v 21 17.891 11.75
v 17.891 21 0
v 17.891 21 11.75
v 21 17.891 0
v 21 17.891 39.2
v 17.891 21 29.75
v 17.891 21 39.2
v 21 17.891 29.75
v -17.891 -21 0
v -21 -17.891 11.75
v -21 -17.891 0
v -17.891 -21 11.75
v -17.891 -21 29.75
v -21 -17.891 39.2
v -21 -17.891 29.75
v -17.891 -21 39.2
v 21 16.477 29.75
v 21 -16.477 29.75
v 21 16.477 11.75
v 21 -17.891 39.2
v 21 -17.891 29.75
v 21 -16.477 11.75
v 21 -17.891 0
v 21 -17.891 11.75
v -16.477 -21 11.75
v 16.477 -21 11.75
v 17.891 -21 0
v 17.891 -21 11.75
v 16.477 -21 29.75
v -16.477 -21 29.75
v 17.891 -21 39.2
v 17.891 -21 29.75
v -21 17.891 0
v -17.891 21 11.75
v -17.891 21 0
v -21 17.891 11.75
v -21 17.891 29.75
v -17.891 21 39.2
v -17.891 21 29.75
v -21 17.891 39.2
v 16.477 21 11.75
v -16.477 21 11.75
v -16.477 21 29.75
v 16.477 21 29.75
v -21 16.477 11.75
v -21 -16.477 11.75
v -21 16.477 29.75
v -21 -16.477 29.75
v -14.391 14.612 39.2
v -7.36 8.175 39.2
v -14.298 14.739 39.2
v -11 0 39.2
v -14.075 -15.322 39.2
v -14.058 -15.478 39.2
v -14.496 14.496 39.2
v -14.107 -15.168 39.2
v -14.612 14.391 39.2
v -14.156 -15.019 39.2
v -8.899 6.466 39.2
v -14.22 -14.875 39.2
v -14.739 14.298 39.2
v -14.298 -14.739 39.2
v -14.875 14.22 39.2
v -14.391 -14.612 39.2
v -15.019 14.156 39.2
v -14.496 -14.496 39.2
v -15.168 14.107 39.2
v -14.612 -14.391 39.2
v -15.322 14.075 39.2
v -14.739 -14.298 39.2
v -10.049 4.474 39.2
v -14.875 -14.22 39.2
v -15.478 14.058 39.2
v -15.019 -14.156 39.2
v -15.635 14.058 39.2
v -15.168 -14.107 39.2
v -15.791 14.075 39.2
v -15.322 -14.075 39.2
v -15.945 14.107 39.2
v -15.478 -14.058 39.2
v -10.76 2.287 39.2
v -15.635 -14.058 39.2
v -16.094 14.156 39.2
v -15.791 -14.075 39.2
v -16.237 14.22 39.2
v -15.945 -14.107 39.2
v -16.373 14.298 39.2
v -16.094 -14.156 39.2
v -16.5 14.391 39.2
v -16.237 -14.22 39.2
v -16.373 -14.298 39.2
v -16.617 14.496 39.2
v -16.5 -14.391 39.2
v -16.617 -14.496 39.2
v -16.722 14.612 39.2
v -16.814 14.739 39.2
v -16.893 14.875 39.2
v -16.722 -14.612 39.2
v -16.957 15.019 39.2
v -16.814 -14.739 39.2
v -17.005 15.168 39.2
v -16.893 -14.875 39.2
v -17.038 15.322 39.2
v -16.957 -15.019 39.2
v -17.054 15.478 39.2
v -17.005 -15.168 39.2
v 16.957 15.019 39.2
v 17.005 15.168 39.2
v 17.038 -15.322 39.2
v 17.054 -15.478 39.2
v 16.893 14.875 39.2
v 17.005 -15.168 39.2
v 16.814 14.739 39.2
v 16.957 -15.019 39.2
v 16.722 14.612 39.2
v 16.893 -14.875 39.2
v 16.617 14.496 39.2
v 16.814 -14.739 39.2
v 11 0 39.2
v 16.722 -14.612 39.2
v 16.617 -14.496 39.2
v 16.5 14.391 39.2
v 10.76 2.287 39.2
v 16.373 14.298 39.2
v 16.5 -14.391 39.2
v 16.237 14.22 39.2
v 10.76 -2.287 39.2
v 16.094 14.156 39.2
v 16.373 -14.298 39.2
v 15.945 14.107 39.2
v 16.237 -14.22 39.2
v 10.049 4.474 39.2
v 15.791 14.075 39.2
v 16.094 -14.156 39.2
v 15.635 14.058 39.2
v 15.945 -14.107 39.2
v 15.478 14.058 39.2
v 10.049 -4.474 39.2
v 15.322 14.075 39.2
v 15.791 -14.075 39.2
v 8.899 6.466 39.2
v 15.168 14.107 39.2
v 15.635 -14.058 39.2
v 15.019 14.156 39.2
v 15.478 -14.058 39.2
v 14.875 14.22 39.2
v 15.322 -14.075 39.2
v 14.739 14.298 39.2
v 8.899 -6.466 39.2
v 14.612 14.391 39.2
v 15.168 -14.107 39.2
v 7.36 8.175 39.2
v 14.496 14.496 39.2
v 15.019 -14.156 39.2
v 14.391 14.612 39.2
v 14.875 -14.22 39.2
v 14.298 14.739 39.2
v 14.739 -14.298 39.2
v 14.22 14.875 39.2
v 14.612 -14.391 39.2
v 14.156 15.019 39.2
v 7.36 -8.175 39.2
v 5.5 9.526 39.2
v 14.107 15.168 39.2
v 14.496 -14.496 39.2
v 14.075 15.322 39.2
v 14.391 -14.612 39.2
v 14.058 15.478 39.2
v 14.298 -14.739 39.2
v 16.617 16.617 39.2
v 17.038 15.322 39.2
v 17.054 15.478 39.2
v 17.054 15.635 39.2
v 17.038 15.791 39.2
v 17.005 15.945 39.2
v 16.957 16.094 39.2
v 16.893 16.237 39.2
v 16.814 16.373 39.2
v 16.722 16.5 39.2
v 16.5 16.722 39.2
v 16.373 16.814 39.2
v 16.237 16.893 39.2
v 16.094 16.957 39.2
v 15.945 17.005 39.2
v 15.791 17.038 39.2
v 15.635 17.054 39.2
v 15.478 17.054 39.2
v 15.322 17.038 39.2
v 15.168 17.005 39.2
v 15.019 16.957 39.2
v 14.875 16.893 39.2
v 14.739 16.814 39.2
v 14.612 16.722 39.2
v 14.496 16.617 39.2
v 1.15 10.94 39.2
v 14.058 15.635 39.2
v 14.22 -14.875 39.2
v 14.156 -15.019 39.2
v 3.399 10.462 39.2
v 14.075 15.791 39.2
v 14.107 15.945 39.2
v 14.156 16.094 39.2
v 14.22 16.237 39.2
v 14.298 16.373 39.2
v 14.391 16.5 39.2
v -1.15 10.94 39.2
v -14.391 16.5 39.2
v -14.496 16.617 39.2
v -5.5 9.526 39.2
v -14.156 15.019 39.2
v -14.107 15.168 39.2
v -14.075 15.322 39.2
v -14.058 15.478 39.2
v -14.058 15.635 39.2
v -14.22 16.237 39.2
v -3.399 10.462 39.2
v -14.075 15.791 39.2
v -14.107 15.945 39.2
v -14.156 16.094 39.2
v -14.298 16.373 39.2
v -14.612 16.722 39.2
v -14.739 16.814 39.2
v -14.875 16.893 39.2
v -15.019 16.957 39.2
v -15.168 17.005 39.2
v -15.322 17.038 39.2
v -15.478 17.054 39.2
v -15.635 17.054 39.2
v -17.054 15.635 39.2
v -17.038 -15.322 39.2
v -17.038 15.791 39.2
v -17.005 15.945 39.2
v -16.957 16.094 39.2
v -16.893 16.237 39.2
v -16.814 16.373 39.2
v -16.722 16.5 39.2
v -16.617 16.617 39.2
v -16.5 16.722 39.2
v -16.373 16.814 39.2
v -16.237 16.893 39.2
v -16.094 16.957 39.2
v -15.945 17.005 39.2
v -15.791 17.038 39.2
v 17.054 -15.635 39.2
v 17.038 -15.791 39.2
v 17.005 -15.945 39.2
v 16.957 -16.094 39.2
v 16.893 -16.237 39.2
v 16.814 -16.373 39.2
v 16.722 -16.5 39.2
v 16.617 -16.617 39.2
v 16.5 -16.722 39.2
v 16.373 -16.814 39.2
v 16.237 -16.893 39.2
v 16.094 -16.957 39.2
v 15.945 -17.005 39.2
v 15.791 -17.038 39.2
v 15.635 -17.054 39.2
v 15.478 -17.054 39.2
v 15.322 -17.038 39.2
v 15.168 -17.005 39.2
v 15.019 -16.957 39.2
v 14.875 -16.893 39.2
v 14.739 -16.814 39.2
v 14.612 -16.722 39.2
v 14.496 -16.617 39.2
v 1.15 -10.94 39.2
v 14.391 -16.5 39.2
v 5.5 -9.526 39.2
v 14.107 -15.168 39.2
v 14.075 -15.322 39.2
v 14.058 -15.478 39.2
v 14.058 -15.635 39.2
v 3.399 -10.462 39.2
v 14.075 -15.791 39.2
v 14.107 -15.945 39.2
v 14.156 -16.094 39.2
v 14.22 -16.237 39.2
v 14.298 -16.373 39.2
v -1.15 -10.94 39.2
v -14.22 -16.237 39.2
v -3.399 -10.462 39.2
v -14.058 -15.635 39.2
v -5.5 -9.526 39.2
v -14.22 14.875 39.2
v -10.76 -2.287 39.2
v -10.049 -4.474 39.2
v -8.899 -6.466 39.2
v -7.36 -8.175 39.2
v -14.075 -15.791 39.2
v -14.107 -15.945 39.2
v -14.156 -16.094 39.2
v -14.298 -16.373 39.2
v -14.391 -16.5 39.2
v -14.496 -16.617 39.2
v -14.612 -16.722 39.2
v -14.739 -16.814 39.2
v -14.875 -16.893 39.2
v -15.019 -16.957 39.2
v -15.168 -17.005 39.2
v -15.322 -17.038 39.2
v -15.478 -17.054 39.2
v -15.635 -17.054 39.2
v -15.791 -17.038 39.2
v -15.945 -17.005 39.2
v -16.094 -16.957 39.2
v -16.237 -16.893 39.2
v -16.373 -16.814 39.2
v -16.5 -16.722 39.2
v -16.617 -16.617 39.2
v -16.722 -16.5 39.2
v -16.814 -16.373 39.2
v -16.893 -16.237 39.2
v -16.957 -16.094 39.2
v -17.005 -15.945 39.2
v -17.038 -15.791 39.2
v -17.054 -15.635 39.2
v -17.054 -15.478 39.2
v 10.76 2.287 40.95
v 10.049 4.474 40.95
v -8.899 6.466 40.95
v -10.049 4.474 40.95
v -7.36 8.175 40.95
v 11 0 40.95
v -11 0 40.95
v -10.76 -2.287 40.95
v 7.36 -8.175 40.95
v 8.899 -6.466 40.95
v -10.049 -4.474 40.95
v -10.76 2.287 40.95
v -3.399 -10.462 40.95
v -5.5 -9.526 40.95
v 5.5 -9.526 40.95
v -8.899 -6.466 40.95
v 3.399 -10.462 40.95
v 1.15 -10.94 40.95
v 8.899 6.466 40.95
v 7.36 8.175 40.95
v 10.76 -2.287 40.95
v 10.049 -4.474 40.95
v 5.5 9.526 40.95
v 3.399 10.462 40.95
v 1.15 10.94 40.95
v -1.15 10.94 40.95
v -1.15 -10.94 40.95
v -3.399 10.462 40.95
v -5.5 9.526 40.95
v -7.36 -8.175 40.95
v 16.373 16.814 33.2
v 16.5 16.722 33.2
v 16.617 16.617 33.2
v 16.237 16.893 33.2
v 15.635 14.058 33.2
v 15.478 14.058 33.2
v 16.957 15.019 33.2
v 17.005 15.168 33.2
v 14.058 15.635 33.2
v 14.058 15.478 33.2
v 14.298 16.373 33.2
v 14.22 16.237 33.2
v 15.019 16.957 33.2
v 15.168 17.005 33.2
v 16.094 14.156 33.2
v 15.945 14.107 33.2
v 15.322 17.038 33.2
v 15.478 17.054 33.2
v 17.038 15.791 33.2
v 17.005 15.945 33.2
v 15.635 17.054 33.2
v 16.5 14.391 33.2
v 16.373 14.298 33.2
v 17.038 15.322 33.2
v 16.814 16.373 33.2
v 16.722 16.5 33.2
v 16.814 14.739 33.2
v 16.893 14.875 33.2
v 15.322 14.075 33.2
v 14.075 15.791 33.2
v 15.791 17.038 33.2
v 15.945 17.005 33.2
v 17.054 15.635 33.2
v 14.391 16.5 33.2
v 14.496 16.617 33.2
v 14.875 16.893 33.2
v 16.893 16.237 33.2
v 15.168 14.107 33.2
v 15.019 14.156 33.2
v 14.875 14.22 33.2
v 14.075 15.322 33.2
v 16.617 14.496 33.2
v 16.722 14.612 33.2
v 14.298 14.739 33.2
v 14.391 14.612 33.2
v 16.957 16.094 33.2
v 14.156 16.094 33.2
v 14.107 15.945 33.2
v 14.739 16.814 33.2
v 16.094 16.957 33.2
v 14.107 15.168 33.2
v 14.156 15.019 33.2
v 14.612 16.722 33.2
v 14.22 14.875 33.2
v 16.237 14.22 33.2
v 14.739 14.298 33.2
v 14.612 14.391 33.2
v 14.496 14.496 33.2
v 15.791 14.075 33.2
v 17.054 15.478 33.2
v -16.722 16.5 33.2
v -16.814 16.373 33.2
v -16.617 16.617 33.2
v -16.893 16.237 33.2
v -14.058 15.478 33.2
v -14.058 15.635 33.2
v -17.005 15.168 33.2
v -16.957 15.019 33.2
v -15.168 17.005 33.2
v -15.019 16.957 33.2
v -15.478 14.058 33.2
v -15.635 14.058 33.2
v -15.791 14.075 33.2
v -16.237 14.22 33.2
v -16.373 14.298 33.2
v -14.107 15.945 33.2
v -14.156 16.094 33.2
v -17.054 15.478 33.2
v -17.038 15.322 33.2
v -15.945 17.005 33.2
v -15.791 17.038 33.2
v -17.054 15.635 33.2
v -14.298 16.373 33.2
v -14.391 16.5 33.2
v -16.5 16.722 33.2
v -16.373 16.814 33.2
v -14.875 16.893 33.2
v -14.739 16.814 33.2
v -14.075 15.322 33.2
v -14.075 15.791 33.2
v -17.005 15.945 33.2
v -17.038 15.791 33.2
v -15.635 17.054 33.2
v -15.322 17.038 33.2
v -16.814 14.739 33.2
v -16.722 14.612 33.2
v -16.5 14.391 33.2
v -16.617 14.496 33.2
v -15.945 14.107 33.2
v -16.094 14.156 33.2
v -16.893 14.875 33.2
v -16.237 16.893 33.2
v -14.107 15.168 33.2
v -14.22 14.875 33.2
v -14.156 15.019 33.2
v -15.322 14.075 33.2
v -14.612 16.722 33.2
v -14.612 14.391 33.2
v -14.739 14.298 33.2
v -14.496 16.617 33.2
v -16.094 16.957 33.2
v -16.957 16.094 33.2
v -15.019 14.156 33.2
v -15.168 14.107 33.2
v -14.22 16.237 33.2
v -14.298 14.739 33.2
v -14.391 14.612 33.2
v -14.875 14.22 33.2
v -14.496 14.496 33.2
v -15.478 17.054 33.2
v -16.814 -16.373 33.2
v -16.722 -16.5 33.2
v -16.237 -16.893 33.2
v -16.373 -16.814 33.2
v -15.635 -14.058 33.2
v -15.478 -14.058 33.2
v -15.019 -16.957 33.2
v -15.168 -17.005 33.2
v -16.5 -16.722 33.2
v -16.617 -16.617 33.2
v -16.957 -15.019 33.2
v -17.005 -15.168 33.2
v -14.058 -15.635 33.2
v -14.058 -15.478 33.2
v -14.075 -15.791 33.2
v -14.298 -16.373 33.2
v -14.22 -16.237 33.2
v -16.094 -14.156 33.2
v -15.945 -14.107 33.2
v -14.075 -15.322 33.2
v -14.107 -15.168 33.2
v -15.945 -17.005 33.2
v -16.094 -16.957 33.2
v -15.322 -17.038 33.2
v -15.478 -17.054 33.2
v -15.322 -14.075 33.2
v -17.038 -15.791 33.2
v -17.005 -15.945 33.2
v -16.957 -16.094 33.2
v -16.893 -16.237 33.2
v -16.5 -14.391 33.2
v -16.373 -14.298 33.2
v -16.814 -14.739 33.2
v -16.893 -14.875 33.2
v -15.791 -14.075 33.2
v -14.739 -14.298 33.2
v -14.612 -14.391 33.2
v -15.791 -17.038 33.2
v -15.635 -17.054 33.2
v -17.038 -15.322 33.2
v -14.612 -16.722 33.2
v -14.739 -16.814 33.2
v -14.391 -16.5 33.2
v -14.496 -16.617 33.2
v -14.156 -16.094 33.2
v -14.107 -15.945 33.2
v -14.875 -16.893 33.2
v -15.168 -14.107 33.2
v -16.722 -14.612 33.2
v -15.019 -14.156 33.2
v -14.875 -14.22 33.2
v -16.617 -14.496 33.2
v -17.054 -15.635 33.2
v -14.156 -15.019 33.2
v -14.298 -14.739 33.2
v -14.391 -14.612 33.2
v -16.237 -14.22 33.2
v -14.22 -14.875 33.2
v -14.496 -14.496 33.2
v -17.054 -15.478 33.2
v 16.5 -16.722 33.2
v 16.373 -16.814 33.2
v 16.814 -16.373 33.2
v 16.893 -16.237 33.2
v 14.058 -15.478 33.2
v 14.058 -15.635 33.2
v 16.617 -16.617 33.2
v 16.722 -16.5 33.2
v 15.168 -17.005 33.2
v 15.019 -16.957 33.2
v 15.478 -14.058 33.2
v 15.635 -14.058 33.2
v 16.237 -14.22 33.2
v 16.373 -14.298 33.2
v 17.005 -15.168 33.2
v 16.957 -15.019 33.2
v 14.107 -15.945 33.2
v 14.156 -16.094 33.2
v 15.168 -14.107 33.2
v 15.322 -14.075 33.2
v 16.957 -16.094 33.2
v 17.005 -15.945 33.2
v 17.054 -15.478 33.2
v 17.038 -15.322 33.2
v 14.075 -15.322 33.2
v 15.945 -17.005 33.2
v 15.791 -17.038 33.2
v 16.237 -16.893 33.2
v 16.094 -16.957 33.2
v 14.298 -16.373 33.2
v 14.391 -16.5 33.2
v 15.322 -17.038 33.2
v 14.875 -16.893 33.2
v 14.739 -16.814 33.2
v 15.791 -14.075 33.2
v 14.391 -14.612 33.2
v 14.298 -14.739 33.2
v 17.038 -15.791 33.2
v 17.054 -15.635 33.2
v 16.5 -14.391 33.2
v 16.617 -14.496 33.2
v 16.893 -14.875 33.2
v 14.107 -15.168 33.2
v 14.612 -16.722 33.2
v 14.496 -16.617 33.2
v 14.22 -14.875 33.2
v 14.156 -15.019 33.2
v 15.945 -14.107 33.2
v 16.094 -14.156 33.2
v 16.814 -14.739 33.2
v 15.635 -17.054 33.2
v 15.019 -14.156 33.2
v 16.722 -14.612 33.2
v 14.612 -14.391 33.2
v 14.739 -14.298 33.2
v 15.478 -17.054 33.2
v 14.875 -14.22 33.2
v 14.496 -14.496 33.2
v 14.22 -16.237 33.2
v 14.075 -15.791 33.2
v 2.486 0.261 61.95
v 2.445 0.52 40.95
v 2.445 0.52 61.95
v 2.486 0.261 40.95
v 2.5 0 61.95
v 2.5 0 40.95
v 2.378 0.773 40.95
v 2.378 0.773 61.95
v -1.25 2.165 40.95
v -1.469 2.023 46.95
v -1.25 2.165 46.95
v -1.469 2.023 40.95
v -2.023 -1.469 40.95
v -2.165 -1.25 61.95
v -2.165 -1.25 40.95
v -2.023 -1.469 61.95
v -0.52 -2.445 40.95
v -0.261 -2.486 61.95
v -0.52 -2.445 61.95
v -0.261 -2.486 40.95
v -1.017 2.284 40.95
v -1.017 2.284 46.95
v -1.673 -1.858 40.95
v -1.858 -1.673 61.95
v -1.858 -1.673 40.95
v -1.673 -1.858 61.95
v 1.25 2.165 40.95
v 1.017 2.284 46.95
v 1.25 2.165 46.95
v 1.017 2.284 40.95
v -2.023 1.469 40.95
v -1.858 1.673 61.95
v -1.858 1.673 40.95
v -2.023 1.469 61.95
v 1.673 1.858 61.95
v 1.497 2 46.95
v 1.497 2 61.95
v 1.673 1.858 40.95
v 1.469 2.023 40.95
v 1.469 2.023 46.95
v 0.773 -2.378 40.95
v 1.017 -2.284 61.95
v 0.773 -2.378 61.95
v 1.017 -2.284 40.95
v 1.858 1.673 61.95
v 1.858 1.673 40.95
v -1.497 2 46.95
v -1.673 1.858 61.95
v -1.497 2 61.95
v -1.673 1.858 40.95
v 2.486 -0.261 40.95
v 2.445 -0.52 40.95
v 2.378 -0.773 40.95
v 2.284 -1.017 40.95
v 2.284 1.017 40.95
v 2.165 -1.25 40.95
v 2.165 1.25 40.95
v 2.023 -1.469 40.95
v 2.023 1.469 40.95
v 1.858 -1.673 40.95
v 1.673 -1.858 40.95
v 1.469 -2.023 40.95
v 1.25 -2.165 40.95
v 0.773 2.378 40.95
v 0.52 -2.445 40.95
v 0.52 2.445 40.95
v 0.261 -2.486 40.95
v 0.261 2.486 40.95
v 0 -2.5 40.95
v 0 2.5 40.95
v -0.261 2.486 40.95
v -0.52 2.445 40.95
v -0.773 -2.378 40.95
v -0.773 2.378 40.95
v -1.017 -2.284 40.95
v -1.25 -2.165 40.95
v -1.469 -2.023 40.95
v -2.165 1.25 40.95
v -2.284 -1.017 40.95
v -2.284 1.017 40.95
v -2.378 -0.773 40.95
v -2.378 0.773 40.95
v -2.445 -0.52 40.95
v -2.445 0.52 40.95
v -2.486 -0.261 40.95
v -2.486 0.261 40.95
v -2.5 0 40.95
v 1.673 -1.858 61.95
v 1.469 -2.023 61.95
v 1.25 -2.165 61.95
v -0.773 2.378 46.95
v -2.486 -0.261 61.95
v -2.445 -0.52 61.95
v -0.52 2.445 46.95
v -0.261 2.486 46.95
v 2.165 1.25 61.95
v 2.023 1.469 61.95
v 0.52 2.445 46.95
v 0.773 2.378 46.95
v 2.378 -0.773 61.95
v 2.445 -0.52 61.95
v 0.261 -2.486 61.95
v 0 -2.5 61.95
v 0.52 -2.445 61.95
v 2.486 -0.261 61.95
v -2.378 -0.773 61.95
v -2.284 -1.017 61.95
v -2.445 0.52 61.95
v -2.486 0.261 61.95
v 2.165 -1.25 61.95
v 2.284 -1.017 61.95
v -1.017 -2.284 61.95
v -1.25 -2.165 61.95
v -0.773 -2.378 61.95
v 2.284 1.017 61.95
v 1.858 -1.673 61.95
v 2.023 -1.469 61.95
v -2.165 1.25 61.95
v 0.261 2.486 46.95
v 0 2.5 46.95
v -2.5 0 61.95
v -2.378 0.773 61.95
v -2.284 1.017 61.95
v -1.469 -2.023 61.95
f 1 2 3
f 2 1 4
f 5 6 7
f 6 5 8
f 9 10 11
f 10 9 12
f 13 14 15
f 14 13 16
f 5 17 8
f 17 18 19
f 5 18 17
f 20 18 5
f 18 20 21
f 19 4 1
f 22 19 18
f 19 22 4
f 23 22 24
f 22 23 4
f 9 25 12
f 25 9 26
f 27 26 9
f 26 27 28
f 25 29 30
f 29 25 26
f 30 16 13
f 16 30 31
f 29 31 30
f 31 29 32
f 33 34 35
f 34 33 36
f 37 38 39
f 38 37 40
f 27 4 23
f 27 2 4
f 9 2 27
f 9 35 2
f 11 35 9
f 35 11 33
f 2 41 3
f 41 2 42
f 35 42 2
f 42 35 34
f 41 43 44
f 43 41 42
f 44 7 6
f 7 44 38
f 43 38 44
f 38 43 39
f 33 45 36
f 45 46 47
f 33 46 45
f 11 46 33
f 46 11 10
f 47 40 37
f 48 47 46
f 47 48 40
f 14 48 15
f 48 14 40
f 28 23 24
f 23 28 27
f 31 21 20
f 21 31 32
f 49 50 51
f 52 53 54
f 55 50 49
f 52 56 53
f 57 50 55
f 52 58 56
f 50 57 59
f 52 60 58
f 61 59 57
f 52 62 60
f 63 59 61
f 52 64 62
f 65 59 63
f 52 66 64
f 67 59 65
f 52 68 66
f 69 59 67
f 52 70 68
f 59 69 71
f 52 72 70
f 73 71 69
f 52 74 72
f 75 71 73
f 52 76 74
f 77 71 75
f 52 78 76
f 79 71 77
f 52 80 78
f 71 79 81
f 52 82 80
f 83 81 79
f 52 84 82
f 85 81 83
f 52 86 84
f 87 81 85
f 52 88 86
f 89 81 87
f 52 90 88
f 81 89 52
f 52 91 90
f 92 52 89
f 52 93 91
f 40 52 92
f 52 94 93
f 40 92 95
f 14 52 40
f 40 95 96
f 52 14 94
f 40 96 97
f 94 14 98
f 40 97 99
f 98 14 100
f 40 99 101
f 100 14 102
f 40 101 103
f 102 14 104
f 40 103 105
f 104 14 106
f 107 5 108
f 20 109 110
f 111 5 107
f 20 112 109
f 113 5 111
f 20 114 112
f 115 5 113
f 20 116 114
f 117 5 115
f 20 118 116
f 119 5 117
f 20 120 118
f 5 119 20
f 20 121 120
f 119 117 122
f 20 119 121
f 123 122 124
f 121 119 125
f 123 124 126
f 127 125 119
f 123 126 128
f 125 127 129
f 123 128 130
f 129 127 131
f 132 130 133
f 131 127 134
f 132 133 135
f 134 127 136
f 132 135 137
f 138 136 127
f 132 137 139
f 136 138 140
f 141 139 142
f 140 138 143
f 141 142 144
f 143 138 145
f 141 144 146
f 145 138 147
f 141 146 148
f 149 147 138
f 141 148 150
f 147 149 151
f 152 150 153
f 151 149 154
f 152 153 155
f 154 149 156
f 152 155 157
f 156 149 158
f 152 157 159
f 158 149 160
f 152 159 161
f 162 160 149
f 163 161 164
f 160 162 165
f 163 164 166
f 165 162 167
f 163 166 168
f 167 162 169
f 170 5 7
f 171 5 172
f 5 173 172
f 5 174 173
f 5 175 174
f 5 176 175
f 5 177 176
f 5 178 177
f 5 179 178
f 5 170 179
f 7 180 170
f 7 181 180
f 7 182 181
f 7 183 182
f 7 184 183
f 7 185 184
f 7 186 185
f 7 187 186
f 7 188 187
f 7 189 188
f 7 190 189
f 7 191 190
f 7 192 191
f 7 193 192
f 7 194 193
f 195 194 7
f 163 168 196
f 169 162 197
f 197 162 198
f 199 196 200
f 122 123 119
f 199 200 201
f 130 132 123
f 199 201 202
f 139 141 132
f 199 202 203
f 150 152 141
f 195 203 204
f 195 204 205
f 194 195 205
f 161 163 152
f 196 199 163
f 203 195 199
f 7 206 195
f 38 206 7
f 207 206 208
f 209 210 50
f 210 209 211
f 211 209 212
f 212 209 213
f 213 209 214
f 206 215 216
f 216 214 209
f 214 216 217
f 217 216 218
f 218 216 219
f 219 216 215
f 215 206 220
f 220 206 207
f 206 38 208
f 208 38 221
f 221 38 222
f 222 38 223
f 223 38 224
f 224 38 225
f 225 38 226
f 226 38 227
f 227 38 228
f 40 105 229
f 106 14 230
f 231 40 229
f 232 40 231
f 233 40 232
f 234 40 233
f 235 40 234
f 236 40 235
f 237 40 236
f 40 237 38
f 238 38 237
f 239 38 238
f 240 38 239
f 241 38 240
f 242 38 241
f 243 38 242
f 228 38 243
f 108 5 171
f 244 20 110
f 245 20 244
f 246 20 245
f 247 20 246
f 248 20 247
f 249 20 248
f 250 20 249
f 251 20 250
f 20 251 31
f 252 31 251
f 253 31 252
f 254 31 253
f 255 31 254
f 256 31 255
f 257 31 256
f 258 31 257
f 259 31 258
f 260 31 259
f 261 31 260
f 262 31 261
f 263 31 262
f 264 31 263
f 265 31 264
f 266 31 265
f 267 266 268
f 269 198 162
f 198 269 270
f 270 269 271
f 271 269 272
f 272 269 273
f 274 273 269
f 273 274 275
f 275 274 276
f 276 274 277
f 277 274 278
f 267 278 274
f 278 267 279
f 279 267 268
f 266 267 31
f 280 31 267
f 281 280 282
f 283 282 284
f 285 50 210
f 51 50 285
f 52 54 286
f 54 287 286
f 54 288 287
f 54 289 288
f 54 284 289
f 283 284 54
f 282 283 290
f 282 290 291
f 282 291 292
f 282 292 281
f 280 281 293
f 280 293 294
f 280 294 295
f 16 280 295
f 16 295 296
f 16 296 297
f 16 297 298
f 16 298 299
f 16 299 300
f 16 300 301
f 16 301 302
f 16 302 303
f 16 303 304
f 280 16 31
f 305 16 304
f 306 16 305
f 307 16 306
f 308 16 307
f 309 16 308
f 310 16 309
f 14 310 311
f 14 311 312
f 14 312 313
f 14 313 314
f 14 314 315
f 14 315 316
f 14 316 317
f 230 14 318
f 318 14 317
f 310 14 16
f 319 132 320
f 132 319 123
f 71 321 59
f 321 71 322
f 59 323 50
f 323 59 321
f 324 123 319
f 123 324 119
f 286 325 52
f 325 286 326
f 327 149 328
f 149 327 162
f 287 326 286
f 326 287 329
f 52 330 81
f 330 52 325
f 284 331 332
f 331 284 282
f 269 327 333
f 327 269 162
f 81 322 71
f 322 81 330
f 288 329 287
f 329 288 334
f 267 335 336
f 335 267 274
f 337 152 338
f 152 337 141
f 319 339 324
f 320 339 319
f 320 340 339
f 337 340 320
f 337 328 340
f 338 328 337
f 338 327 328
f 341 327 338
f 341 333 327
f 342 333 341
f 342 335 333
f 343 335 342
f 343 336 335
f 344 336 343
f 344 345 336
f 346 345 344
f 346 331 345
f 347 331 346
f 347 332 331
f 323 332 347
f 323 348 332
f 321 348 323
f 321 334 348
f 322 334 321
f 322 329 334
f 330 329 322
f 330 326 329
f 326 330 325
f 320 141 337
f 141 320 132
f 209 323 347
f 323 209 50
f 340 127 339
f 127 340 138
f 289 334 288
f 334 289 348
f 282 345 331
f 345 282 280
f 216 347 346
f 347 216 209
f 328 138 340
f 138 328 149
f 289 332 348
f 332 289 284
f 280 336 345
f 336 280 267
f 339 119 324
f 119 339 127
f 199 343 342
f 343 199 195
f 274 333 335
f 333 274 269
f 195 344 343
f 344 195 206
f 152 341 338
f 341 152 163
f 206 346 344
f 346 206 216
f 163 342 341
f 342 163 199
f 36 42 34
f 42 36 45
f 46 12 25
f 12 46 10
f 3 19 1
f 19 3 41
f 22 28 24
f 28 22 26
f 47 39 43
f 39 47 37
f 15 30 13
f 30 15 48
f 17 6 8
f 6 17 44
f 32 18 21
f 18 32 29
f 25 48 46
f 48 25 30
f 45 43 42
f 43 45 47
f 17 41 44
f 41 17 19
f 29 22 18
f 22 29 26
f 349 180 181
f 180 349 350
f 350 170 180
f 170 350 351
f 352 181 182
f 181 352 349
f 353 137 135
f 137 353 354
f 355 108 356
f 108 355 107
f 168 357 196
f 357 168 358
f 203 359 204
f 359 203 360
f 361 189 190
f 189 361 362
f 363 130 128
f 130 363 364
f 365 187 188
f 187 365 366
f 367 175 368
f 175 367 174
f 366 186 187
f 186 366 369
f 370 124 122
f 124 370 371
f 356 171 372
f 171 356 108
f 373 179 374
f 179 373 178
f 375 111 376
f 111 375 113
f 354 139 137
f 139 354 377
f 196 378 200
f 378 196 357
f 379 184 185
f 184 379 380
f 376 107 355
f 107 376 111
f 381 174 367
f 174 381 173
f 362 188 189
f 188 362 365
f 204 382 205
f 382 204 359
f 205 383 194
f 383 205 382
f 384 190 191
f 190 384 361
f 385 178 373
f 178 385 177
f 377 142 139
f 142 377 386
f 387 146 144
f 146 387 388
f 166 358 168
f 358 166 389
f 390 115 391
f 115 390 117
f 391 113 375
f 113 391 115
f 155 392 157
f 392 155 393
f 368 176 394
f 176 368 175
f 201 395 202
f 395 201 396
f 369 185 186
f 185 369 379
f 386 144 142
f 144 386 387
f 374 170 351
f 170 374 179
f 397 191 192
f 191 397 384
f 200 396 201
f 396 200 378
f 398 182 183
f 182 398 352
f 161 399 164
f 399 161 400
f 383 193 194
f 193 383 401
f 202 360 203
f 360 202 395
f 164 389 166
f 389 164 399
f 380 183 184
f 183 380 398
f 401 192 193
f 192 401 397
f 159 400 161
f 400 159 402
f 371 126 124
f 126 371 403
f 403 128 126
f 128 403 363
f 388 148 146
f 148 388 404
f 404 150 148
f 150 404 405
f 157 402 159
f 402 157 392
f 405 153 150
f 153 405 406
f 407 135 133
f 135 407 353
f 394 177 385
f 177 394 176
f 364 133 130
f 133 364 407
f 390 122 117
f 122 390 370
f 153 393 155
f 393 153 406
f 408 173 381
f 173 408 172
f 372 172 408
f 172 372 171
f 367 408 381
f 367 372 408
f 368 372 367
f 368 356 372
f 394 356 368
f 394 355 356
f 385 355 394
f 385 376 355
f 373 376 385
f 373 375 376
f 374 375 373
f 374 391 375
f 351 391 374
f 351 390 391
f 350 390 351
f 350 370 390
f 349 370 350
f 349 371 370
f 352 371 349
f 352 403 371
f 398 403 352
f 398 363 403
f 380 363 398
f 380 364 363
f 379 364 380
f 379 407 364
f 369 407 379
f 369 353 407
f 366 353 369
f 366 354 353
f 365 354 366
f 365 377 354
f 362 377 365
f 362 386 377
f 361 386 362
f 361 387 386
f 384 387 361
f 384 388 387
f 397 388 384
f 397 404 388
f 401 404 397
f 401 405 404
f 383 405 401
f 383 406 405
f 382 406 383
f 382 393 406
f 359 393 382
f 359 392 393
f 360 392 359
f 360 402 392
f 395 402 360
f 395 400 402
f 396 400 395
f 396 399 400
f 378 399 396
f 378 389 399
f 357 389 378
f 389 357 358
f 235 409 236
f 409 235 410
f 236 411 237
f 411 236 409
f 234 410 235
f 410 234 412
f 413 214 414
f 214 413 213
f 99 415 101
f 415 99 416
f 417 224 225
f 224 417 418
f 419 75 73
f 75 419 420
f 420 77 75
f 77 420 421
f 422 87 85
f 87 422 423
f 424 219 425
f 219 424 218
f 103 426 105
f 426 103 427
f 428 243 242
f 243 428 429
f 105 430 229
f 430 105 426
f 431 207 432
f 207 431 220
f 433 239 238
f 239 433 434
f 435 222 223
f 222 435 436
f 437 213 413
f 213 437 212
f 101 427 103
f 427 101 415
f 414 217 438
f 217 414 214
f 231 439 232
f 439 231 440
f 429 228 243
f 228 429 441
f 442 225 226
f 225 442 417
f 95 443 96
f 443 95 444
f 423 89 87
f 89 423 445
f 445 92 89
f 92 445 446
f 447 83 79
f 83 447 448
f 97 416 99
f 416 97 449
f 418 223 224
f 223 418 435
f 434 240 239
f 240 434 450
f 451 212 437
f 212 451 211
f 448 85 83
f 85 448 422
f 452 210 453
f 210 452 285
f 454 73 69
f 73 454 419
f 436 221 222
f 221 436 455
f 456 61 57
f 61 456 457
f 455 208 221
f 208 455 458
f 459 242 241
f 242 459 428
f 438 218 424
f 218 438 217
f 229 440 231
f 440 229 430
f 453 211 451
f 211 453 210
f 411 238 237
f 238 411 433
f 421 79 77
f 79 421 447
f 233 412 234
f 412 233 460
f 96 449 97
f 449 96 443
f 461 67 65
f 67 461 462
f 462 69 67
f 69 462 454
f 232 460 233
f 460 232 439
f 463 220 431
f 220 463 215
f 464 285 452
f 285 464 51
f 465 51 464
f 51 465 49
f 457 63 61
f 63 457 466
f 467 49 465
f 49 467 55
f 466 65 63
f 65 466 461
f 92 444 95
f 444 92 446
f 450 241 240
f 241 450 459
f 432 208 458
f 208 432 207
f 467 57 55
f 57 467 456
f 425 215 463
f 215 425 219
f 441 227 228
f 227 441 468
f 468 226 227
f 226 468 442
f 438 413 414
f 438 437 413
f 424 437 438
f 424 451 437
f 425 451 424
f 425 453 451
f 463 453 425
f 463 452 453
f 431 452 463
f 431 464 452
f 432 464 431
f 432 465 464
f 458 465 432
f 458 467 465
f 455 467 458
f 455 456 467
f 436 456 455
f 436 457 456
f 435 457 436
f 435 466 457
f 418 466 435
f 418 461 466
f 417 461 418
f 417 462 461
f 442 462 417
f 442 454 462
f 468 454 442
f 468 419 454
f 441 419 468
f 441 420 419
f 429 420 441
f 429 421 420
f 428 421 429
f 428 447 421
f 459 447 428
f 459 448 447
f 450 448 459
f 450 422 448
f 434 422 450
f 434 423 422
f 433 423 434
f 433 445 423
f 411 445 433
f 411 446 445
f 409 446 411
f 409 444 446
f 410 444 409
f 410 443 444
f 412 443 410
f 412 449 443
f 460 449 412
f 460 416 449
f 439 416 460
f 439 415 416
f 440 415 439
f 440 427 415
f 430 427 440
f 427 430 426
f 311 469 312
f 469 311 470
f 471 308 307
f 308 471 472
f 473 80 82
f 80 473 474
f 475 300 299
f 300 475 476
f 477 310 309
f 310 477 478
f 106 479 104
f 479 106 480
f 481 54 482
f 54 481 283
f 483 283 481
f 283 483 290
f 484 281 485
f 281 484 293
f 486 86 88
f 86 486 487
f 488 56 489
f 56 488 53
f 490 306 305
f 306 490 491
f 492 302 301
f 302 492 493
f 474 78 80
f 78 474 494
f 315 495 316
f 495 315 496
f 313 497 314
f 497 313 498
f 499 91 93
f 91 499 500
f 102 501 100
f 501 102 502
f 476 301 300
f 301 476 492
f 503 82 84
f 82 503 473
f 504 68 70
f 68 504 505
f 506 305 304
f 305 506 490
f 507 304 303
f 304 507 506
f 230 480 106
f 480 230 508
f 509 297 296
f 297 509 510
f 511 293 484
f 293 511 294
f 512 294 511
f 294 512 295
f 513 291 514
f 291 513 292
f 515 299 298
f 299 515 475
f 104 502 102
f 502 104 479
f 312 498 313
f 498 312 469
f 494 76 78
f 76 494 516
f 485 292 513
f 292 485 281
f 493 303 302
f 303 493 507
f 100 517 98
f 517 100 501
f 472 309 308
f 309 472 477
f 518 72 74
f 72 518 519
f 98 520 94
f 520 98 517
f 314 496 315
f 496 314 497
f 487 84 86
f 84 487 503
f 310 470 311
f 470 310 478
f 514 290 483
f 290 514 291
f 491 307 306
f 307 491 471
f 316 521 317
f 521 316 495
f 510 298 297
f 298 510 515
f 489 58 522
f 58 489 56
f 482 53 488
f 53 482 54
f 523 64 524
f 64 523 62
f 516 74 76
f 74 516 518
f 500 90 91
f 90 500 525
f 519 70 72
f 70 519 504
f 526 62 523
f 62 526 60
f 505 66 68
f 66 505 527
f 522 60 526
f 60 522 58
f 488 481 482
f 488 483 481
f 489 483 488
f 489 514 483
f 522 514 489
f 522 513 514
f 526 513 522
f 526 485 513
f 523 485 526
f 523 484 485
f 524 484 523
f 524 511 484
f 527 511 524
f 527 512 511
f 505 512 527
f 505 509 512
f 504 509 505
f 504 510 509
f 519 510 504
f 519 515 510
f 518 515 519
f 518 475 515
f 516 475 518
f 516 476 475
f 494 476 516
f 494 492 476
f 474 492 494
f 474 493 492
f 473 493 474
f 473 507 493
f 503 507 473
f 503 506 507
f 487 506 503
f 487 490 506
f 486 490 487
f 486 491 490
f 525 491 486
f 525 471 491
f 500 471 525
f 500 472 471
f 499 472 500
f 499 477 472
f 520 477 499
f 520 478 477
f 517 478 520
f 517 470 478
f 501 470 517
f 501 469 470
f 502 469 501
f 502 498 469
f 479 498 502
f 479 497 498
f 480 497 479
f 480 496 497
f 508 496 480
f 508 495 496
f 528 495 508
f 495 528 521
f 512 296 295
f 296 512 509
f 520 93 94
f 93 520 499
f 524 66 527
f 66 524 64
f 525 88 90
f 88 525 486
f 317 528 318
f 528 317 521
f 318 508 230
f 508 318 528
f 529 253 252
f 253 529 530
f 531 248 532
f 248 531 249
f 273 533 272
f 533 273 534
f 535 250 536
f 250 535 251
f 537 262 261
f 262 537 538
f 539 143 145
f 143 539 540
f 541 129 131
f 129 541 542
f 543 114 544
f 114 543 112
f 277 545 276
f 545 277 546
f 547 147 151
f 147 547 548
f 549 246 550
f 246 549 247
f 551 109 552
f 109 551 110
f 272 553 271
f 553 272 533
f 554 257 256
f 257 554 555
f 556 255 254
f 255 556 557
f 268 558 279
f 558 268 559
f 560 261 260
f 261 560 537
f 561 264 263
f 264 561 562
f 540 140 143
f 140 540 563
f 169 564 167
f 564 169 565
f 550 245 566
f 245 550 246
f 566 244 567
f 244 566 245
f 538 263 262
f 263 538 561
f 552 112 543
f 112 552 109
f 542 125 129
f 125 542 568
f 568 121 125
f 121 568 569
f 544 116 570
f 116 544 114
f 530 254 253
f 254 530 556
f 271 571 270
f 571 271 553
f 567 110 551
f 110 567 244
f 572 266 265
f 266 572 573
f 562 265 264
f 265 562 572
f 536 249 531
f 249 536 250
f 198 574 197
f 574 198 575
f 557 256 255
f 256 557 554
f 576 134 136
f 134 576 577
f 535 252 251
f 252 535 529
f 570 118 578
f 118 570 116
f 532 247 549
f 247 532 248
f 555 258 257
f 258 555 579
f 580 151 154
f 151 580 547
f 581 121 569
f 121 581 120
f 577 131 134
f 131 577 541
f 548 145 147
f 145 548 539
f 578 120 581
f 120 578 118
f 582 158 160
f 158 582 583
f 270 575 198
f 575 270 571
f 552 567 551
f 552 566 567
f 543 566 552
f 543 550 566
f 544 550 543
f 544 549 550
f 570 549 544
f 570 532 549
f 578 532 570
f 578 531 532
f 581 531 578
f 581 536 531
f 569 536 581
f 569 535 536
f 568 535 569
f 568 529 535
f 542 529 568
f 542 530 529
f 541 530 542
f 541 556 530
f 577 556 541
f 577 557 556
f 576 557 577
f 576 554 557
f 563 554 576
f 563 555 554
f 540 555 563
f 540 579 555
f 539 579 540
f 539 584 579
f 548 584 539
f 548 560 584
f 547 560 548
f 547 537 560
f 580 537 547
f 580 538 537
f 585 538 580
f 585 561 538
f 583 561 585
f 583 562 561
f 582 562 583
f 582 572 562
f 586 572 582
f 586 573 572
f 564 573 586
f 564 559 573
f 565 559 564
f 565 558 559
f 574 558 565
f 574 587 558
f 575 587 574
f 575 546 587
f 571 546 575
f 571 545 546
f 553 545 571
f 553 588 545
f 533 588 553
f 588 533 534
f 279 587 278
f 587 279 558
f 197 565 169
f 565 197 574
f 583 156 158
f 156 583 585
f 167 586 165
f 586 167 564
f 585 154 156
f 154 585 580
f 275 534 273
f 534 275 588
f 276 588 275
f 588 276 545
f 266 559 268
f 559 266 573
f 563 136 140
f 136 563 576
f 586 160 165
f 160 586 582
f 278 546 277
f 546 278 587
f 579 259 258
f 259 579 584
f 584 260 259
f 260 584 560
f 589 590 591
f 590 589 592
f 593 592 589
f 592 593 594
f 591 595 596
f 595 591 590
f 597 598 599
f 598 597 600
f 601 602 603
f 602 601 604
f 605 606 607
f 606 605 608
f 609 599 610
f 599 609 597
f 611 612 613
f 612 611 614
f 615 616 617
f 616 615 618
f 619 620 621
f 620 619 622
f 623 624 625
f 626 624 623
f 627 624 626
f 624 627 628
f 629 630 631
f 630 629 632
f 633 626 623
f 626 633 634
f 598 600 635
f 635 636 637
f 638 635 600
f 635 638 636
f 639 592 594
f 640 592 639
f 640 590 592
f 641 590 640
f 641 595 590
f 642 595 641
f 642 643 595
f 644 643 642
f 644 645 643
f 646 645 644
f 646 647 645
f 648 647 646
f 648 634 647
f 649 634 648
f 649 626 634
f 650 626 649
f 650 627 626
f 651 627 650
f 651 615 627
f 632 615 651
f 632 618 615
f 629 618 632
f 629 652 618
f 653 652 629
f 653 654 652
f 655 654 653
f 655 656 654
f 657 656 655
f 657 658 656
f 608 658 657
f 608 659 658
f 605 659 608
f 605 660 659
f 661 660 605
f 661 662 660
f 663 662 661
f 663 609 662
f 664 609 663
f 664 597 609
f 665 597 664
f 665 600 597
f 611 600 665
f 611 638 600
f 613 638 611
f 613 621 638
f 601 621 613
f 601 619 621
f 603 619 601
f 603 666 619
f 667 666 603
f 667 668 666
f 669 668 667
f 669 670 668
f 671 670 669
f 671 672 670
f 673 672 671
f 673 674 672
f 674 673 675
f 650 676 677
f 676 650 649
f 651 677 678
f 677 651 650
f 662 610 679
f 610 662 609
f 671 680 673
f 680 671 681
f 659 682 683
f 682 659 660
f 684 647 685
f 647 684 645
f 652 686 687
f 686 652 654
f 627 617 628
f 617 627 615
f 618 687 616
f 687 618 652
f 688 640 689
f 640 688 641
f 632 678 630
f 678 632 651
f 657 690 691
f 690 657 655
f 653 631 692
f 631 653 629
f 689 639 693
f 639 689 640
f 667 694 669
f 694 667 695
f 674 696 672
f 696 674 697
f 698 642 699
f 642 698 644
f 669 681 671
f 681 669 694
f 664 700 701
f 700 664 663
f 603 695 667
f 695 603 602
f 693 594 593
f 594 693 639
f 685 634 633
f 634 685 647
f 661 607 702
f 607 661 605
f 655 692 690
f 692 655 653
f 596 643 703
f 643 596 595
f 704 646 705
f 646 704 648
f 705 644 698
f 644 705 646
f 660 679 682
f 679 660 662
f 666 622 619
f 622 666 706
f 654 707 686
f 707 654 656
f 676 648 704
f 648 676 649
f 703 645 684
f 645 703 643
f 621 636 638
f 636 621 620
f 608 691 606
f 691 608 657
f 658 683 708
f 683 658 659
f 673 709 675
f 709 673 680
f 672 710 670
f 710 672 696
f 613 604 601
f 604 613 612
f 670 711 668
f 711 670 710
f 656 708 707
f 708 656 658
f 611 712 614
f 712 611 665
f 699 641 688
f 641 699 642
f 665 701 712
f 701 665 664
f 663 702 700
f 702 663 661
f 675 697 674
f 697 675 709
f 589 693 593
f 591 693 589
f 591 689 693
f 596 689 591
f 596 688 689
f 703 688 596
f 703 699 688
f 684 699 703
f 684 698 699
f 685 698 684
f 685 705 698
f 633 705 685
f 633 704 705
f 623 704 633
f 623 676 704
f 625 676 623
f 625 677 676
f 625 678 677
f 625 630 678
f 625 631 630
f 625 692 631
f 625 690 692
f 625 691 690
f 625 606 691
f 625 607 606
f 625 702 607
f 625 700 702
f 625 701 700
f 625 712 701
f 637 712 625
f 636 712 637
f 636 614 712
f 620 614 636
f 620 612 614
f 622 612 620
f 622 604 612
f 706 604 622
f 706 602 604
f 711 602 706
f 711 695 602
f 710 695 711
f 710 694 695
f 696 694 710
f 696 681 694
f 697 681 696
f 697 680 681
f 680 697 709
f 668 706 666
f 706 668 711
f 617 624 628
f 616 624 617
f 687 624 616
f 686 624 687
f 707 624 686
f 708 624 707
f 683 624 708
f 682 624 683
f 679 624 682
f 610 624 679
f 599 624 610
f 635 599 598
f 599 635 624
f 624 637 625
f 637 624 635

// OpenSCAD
// NEMA 17 stepper motor
// Source: https://www.thingiverse.com/thing:2348650
// Author: gammagec
// License: CC-BY

// Slightly modified to add flat edge to shaft.

// See 'Product Detail' tab of:
// http://motechmotor.com/productDetail-0104-33.html

module nema17() {
    difference() {
        body();
        screw_holes();
    }
    shaft();

    module body() {
        difference() {
            union() {
                color("slategray")
                linear_extrude(39)
                    base_sketch();

                color("silver")
                translate([ 0, 0, 39 ])
                linear_extrude(0.2)
                    base_sketch();

                circular_base();
            }
            middle_cut();
        }
    }

    module screw_holes() {
        $fn = 60;
        d = 44;
        r = d / 2;
        for (i = [45:90:360])
            rotate([ 0, 0, i ])
            translate([ r, 0, 39.2 - 6 ])
                cylinder(d = 3, h = 7.2);
    }

    module shaft() {
        $fn = 60;
        translate([ 0, 0, 40.95 ])
        difference() {
            cylinder(d = 5, h = 21);

            translate([-2.5, 2, 6])
                cube([5, 5, 15]);
        }
    }

    module circular_base() {
        color("slategray")
        translate([ 0, 0, 39.2 ])
        linear_extrude(1.75)
            circle(d = 22);
    }

    module middle_cut() {
        translate([ 0, 0, 11.75 ])
        linear_extrude(18)
            chamfer(53);
    }

    module chamfer(amt) {
        rotate([ 0, 0, 45 ]) difference() {
            square(100, true);
            square(amt, true);
        }
    }

    module base_sketch() {
        difference() {
            square(42, true);
            chamfer(55);
        }
    }
}

nema17();
